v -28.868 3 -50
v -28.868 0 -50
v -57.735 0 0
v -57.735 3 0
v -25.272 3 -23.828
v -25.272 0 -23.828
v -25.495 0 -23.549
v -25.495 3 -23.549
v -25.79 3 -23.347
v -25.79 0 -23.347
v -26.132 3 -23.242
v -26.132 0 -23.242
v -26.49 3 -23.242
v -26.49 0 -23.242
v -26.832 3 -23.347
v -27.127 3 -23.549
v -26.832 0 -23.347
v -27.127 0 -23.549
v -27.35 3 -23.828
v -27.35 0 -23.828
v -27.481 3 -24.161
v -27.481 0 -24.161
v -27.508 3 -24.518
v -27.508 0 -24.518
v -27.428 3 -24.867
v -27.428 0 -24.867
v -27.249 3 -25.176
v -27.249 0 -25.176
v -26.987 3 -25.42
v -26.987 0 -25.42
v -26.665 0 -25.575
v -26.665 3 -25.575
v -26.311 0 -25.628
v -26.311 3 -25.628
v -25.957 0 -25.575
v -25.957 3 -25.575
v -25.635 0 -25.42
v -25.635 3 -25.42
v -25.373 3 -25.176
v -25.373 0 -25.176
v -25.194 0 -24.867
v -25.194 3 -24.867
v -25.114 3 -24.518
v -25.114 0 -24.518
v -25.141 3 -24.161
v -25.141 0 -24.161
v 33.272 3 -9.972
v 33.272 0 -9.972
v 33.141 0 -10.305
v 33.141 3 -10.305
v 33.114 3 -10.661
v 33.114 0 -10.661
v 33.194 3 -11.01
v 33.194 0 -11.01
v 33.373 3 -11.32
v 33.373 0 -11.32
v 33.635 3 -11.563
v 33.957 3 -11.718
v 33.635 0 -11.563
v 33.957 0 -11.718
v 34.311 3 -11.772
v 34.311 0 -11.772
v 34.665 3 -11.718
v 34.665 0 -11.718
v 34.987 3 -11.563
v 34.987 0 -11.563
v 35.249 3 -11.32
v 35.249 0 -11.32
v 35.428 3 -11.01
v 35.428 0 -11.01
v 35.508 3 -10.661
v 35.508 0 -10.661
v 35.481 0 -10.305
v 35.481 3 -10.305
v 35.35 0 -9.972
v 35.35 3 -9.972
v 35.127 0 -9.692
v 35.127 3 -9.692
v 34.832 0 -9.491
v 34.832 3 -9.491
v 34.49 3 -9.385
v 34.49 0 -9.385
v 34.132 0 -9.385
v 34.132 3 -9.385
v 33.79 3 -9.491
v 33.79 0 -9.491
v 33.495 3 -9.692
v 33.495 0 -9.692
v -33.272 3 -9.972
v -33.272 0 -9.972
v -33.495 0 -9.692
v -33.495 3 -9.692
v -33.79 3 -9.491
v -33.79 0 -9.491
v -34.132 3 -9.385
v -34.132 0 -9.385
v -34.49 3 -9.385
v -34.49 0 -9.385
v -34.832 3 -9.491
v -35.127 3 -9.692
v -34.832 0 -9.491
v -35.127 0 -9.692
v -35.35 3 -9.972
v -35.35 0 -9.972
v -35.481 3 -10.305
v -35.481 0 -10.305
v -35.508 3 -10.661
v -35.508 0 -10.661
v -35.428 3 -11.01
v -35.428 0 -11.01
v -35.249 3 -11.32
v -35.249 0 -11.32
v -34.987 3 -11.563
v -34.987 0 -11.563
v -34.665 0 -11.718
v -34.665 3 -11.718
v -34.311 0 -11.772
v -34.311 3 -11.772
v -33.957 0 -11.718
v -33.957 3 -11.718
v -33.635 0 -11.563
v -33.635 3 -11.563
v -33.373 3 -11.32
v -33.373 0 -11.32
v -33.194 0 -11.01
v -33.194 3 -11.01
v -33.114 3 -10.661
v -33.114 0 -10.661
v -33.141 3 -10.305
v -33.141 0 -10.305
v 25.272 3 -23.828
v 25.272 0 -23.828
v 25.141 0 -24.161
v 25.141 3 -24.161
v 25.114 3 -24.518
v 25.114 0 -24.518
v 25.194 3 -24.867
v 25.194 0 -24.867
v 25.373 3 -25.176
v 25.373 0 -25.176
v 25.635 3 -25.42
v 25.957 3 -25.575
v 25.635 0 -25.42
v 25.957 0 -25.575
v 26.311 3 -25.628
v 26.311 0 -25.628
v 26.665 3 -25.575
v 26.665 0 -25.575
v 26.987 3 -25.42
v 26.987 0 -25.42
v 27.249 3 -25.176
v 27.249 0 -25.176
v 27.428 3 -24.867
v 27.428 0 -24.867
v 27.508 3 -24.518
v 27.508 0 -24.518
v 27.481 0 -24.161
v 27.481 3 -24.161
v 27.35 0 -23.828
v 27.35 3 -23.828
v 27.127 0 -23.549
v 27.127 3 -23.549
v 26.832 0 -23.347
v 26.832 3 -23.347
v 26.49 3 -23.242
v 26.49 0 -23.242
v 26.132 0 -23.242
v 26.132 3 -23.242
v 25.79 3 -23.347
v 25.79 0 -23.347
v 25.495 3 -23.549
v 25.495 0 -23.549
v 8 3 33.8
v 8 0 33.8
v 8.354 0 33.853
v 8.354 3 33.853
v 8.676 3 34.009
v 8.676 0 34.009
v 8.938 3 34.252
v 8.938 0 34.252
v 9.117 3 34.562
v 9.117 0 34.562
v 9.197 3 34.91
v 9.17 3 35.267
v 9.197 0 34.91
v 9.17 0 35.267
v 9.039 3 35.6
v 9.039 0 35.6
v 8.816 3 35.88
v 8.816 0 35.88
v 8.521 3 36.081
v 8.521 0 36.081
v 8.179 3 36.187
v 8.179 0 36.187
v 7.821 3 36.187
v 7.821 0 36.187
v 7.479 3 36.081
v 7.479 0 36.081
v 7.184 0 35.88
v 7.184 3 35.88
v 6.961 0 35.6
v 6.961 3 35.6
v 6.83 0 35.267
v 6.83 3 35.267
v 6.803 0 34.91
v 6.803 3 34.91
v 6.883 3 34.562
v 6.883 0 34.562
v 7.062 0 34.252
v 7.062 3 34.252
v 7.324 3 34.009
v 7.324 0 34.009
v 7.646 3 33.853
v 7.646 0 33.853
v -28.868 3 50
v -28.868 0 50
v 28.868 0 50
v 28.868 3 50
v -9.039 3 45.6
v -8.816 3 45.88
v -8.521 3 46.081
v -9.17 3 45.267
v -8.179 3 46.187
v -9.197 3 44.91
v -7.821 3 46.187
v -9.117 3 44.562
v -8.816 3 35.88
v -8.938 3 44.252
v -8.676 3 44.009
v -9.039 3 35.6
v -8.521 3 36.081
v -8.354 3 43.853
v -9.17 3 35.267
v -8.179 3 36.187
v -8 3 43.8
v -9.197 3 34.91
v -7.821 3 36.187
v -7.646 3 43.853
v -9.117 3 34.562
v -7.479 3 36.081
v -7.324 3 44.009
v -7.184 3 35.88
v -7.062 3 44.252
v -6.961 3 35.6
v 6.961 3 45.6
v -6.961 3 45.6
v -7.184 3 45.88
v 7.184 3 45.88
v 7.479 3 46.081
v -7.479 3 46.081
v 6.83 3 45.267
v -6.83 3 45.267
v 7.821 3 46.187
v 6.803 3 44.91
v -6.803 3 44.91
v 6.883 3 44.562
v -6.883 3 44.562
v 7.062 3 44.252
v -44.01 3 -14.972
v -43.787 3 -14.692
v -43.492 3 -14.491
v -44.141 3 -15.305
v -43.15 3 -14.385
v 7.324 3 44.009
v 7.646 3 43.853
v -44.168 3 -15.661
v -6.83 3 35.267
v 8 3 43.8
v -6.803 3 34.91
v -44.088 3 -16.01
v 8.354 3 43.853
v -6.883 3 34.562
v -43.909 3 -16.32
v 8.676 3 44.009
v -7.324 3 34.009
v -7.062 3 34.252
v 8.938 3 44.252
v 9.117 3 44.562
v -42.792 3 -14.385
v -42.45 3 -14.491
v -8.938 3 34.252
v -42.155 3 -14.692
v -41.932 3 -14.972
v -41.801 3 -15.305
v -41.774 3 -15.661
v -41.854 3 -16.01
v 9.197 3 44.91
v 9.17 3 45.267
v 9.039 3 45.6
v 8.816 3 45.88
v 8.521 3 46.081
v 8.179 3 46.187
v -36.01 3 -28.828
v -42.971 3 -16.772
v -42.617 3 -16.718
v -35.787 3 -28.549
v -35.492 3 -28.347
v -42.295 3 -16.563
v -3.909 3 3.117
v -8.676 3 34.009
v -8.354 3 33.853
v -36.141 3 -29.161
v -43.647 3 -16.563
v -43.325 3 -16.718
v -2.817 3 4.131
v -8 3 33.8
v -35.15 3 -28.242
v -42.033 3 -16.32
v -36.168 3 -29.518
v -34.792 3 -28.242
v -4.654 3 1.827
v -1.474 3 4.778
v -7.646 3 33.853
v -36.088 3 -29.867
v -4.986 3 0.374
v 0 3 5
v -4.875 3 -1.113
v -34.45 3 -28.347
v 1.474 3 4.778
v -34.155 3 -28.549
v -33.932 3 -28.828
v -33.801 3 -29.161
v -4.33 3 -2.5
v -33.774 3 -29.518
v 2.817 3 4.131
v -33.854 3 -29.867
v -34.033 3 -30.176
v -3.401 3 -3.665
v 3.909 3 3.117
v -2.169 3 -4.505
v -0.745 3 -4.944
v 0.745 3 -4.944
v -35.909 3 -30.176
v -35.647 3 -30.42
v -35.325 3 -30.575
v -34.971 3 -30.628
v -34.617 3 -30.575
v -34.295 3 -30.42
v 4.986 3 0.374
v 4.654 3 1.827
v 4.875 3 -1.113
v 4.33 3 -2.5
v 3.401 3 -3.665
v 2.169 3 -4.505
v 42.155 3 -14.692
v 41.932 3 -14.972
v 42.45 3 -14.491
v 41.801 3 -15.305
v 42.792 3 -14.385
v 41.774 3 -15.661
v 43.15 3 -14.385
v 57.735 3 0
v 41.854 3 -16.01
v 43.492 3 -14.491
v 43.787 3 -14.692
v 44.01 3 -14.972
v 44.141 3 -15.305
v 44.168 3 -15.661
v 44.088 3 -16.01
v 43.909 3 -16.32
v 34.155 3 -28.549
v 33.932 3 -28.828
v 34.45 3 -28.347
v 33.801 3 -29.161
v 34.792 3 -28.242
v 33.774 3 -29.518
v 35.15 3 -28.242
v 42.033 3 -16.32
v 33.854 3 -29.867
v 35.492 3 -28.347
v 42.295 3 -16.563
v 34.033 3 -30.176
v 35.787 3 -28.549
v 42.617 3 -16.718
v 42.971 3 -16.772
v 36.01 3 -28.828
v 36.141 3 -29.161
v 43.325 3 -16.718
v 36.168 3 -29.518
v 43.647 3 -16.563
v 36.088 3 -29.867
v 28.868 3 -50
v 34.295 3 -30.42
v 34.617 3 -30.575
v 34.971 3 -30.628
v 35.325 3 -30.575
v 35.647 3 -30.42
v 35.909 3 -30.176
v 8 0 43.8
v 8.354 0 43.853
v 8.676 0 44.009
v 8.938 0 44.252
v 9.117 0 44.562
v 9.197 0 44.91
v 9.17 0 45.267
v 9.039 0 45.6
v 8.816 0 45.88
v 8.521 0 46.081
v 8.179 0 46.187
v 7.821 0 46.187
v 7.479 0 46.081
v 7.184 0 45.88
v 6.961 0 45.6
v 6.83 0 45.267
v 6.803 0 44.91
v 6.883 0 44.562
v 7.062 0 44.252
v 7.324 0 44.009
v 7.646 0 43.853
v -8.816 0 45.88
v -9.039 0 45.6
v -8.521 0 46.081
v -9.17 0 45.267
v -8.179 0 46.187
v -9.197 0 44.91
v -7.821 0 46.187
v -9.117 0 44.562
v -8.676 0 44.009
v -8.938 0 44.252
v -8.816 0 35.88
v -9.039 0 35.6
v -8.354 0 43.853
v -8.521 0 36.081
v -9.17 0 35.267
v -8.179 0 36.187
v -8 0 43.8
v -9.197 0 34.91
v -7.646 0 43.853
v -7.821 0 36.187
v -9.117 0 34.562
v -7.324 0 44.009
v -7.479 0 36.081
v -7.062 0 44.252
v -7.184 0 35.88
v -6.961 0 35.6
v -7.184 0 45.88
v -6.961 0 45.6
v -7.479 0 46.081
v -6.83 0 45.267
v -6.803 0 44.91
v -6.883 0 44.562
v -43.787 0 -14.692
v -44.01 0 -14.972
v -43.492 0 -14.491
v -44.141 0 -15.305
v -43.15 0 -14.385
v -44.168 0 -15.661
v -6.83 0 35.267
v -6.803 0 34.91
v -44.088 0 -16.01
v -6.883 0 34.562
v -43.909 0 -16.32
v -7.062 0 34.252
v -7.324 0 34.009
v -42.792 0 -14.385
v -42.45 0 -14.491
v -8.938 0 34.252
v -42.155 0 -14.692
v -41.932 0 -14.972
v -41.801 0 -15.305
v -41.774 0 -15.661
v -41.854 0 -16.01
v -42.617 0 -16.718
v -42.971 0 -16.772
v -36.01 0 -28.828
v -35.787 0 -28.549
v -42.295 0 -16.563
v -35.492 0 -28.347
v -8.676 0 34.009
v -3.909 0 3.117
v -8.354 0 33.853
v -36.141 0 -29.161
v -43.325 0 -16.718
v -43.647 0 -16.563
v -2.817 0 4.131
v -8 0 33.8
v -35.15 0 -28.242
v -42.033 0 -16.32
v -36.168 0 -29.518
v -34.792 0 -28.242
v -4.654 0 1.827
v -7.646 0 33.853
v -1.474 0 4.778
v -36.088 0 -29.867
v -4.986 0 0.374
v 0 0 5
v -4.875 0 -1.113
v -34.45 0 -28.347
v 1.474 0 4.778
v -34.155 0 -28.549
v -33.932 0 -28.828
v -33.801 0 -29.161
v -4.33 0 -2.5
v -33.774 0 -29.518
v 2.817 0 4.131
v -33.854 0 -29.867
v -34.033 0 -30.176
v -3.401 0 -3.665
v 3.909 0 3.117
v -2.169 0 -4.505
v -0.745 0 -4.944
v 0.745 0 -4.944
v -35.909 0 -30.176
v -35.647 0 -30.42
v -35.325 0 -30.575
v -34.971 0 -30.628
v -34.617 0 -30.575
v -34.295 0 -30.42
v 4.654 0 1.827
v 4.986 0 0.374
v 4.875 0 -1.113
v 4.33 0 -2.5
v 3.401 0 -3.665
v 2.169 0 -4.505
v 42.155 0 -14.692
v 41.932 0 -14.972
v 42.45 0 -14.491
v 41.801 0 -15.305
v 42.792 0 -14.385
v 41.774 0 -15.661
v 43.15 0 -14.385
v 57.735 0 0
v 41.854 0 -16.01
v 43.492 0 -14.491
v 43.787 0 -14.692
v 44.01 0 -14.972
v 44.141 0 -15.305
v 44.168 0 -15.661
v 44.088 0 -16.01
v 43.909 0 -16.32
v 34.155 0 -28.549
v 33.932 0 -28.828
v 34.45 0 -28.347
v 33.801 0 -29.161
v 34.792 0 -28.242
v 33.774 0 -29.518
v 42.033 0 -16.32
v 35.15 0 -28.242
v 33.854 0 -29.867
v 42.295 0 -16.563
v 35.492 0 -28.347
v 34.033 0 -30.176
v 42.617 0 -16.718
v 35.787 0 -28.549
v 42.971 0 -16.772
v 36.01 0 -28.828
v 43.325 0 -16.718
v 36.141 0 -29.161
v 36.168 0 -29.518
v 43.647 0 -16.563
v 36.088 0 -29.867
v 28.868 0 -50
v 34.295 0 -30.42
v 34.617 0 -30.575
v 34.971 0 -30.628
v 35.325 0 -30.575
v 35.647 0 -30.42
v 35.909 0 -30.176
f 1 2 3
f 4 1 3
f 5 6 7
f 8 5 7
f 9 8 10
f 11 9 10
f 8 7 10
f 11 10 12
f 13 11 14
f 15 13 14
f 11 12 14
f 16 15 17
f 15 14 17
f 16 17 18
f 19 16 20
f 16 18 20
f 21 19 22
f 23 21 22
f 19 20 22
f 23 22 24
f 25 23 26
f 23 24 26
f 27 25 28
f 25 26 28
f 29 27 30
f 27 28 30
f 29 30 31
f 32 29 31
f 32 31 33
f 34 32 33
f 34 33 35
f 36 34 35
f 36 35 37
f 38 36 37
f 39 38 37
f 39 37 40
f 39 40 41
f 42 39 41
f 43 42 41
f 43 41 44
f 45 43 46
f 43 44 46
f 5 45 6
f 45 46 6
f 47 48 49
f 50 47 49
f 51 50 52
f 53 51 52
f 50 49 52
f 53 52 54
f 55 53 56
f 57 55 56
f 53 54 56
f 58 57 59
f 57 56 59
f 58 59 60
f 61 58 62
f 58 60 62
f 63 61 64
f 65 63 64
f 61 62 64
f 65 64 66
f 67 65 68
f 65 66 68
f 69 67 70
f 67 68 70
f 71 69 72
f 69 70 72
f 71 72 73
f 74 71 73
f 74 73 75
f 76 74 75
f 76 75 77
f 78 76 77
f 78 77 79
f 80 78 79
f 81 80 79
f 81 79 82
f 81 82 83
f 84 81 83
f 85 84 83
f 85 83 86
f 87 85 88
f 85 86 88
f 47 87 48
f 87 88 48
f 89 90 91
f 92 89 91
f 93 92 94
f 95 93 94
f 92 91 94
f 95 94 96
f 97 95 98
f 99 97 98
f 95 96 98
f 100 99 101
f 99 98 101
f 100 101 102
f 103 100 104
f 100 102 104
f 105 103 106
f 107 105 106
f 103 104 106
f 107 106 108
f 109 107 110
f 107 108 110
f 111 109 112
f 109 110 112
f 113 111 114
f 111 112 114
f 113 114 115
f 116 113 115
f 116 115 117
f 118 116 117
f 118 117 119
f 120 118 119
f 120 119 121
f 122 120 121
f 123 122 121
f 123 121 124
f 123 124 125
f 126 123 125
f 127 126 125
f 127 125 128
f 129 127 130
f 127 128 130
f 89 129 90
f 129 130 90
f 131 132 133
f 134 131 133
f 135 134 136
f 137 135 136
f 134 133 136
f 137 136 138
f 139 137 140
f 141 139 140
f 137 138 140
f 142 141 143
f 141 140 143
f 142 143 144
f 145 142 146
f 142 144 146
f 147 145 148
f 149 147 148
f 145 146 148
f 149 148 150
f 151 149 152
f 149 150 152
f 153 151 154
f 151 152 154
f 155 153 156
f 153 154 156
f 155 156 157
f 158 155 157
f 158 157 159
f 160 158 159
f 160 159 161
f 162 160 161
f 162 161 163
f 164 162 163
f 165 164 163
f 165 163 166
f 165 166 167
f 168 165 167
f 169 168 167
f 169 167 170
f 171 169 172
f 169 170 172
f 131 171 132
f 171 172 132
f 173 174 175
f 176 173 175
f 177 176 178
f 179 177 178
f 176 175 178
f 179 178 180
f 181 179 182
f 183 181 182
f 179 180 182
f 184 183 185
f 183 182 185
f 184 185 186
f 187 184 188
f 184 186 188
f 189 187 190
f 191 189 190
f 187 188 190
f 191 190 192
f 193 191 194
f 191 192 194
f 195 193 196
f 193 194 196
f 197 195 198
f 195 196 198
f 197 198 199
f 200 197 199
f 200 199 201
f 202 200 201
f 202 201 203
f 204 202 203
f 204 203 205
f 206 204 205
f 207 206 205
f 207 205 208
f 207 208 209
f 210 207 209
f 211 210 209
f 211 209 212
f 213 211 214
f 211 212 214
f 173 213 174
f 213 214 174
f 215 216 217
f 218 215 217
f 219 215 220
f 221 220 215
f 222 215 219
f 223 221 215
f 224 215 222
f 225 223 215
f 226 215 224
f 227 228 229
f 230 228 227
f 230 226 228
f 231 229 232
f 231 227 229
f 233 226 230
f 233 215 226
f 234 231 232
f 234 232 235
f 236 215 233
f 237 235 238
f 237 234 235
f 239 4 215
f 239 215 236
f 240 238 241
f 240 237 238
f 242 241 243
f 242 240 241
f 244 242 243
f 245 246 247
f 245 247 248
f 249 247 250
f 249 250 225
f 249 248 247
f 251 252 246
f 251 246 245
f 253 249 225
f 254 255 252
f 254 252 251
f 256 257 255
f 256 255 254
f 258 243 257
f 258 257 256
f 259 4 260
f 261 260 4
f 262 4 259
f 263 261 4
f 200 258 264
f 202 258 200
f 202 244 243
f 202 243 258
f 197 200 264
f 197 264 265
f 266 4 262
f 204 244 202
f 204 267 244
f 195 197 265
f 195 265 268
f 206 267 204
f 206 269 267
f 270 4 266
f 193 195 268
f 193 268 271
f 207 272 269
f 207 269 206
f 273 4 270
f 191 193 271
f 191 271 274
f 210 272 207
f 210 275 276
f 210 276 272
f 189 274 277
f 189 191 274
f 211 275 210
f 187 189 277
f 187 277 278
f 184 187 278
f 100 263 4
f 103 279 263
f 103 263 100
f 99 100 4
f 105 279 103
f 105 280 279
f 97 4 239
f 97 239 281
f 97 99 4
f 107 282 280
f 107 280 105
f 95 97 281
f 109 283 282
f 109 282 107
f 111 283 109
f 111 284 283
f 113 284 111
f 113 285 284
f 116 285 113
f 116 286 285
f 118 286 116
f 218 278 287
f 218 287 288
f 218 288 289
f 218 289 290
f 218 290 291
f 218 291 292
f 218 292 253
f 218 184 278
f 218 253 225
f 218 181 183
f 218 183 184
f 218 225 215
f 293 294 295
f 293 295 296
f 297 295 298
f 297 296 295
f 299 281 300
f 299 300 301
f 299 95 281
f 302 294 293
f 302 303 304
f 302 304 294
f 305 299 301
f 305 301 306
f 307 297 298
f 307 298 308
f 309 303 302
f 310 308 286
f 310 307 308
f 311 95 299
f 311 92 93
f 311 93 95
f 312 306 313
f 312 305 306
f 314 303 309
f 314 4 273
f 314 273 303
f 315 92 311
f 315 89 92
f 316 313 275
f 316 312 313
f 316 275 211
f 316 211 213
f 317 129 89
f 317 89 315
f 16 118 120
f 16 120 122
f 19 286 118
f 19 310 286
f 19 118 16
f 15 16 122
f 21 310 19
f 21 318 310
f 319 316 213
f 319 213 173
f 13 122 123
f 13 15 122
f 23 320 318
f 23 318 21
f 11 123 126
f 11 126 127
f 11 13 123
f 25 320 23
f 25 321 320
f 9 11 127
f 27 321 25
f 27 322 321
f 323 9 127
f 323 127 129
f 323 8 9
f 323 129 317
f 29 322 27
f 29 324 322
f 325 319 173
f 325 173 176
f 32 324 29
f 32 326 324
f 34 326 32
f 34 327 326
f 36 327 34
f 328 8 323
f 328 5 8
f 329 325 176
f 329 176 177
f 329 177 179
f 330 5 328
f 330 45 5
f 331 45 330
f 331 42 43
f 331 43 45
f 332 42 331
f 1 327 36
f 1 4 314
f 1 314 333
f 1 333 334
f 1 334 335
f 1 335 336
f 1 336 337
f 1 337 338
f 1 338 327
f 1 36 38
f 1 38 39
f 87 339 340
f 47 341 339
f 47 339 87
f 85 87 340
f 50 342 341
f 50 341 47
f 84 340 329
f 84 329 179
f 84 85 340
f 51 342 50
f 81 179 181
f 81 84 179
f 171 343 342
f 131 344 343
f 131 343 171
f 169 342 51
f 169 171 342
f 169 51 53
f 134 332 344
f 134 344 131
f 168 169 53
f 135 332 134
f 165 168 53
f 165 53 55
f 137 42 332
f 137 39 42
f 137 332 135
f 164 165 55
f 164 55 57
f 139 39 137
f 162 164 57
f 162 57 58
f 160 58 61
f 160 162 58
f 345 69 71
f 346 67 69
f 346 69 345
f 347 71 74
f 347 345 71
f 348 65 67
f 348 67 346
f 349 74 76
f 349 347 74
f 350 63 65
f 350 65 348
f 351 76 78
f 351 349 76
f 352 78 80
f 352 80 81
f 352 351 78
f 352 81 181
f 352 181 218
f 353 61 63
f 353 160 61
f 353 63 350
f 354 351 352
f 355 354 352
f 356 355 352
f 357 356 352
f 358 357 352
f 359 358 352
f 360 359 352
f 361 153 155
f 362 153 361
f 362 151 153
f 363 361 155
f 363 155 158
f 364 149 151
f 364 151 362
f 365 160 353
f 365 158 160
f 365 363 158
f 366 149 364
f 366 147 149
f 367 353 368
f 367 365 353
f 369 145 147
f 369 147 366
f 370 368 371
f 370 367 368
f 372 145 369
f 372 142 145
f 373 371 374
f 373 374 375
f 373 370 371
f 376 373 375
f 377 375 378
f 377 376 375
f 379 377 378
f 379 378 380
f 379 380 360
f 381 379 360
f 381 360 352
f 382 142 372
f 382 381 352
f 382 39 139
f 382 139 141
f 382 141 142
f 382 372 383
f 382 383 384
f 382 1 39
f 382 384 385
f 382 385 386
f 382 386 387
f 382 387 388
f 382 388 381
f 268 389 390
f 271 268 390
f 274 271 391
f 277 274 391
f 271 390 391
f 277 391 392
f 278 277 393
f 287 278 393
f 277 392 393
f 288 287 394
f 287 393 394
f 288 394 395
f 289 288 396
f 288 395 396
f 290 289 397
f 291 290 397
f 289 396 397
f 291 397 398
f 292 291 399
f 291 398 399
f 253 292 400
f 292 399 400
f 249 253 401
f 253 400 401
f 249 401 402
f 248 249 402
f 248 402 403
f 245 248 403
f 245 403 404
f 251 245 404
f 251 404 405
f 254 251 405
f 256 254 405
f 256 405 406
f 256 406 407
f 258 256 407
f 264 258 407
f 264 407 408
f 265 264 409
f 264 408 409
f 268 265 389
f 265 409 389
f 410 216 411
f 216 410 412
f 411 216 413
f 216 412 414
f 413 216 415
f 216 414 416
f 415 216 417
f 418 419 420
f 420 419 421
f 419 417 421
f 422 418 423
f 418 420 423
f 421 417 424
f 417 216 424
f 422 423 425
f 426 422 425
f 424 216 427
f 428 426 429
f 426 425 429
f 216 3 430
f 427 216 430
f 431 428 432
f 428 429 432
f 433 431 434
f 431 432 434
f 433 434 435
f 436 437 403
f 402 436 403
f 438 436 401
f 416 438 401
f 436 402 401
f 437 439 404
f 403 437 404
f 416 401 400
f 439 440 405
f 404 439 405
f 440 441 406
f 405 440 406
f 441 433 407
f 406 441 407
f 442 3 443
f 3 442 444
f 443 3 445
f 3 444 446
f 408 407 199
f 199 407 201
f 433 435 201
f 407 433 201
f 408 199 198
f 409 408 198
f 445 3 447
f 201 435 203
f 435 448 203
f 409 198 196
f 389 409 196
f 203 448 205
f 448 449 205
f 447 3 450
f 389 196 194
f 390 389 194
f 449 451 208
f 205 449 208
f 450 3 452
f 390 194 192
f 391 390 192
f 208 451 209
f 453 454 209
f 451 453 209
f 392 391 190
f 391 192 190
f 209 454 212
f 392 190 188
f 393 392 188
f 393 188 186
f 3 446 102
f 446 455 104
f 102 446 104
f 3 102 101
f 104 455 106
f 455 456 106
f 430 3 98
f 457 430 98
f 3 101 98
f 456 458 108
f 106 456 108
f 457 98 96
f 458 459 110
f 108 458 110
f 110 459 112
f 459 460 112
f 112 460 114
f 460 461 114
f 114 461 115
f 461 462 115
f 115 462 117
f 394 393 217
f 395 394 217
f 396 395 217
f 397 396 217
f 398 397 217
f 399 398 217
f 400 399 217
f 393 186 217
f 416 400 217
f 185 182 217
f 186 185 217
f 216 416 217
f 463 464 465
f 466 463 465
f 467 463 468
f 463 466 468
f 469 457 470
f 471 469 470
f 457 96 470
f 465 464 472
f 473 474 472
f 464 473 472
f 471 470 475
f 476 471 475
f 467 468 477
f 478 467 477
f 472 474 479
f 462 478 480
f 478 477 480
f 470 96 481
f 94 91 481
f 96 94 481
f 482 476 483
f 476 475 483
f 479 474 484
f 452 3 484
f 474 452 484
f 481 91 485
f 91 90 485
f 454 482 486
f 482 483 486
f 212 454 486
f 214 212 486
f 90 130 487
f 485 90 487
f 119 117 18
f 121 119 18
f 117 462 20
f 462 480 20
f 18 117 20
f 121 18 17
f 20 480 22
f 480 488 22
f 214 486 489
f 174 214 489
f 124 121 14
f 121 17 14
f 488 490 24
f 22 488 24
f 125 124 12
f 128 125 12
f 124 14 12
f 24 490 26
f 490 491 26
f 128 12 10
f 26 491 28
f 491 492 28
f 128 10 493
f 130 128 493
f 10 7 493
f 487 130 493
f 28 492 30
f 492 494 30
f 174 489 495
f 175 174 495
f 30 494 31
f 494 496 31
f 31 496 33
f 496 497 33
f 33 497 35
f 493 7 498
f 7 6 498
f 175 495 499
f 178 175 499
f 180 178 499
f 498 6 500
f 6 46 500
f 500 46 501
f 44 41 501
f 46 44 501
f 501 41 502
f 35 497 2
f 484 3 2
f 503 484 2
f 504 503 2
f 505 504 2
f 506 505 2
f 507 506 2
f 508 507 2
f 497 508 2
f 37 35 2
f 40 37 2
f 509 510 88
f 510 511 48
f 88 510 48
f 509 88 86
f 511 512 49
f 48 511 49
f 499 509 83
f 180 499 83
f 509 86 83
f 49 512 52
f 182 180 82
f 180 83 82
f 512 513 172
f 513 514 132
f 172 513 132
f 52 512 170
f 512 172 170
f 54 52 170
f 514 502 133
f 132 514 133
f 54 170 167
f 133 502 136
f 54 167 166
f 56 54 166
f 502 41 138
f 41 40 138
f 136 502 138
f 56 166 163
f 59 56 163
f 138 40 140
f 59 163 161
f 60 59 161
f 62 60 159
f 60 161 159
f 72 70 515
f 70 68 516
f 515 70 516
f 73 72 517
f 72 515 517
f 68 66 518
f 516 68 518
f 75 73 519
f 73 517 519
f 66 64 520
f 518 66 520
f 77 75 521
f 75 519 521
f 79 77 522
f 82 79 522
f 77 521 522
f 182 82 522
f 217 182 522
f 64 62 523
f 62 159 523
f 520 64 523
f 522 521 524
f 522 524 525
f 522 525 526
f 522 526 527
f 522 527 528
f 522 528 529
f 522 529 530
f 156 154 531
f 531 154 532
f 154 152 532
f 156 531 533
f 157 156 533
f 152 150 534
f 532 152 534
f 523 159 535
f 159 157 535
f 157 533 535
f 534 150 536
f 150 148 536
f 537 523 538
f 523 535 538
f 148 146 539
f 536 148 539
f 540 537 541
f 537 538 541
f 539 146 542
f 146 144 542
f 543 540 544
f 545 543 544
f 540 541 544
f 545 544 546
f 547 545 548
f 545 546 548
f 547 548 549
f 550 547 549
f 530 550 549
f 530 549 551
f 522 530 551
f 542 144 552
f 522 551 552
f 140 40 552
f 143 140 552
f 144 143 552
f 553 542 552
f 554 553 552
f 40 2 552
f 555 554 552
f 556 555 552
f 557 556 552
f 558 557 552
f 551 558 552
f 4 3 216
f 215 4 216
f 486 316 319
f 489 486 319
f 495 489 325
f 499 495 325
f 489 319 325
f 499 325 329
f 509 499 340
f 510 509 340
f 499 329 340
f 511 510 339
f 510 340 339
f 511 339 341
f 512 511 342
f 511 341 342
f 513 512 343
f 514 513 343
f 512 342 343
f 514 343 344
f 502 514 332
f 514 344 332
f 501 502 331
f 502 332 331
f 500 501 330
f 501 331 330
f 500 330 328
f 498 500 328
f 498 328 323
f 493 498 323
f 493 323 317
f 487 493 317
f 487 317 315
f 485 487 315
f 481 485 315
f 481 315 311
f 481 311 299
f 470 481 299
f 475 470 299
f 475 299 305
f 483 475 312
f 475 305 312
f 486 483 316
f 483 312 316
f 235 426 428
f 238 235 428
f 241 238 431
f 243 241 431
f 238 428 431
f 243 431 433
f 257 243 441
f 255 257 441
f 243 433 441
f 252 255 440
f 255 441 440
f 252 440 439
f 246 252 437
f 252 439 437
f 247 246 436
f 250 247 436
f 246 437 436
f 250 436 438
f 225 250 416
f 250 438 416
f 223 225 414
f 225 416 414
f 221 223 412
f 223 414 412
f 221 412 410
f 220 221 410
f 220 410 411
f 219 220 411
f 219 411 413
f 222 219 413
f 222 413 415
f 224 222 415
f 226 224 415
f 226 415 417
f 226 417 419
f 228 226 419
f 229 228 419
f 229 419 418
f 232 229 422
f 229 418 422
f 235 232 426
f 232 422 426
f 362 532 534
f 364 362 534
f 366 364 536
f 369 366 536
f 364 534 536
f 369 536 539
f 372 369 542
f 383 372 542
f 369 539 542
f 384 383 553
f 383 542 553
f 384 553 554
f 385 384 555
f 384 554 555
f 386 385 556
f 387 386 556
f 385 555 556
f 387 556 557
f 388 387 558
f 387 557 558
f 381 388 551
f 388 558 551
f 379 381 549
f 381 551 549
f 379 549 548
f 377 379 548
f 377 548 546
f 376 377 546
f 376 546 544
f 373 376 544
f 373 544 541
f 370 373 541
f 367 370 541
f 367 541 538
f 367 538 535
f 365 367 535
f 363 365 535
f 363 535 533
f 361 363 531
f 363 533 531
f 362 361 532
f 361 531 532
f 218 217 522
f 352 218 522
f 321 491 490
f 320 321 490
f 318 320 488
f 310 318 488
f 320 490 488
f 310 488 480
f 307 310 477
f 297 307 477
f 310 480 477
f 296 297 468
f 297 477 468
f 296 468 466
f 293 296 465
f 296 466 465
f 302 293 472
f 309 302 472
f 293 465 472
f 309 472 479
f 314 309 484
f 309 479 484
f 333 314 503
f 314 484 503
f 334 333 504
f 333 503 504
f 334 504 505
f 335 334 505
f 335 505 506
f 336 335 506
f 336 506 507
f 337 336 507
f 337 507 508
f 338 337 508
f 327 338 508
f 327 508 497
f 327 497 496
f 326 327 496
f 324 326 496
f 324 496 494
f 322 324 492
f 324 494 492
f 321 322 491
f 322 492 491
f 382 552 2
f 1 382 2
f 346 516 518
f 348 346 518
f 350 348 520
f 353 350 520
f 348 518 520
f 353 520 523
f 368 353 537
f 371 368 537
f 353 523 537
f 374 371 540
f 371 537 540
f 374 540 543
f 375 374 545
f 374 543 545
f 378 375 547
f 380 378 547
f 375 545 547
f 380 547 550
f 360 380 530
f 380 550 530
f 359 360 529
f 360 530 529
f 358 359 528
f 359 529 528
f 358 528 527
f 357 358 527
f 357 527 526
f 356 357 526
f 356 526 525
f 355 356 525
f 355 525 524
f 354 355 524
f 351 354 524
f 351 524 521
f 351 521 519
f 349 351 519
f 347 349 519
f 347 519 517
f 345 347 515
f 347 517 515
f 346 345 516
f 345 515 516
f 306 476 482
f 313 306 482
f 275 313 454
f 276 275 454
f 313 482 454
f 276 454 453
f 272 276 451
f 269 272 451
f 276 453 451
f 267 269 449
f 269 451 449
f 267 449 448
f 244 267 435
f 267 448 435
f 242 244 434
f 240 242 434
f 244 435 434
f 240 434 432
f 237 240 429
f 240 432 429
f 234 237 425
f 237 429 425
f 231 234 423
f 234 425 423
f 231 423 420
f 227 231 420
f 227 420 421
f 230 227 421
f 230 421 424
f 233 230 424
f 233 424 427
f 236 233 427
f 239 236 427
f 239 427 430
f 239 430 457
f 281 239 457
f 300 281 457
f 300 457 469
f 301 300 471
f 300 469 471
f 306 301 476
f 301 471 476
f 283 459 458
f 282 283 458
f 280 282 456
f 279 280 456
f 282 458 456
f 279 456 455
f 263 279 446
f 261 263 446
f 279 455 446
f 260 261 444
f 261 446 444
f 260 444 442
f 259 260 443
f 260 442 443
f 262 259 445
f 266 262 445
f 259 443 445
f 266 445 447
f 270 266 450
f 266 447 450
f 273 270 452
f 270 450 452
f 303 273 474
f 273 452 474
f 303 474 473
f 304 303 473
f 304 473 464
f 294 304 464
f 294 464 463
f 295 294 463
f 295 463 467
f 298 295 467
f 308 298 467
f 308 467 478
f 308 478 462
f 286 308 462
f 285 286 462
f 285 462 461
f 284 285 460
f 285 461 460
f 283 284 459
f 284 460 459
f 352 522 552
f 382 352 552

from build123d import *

# Parameters (mm, degrees)
EXTRUDE_1_DEPTH          = 3
SKETCH_2_R               = 5
CUT_EXTRUDE_1_DEPTH      = 3
SKETCH_3_R               = 1.2
CUT_EXTRUDE_2_DEPTH      = 3
PATTERN_CIRCULAR_1_COUNT = 3


with BuildPart() as part:
    # 草图1 → 凸台-拉伸1 (new body)
    with BuildSketch(Plane(origin=(0, 0, 0), x_dir=(1, 0, 0), z_dir=(0, 1, 0))):
        Polygon((28.867513459, 50), (-28.867513459, 50), (-57.735026919, 0), (-28.867513459, -50), (28.867513459, -50), (57.735026919, 0), align=None)
    extrude(amount=EXTRUDE_1_DEPTH)

    # 草图2 → 切除-拉伸1 (cut)
    with BuildSketch(Plane(origin=(0, 3, 0), x_dir=(1, 0, 0), z_dir=(0, 1, 0))):
        with Locations(Location((0, 0, 0), (0, 0, 270))):
            Circle(SKETCH_2_R)
    extrude(amount=-CUT_EXTRUDE_1_DEPTH, mode=Mode.SUBTRACT)

    # 草图3 → 切除-拉伸2 (cut)
    with BuildSketch(Plane.XZ):
        with Locations(Location((-8, 45, 0), (0, 0, 270))):
            Circle(SKETCH_3_R)
        with Locations(Location((8, 45, 0), (0, 0, 270))):
            Circle(SKETCH_3_R)
        with Locations(Location((8, 35, 0), (0, 0, 270))):
            Circle(SKETCH_3_R)
        with Locations(Location((-8, 35, 0), (0, 0, 270))):
            Circle(SKETCH_3_R)
    cut_extrude_2 = extrude(amount=-CUT_EXTRUDE_2_DEPTH, mode=Mode.SUBTRACT)

    # 阵列(圆周)1: 切除-拉伸2 ×3 about axis
    pattern_circular_1_axis = Axis((0, 0, 0), (0, 1, 0))
    for i in range(1, PATTERN_CIRCULAR_1_COUNT):
        add(cut_extrude_2.rotate(pattern_circular_1_axis, i * 360 / PATTERN_CIRCULAR_1_COUNT), mode=Mode.SUBTRACT)


solid = part.part
